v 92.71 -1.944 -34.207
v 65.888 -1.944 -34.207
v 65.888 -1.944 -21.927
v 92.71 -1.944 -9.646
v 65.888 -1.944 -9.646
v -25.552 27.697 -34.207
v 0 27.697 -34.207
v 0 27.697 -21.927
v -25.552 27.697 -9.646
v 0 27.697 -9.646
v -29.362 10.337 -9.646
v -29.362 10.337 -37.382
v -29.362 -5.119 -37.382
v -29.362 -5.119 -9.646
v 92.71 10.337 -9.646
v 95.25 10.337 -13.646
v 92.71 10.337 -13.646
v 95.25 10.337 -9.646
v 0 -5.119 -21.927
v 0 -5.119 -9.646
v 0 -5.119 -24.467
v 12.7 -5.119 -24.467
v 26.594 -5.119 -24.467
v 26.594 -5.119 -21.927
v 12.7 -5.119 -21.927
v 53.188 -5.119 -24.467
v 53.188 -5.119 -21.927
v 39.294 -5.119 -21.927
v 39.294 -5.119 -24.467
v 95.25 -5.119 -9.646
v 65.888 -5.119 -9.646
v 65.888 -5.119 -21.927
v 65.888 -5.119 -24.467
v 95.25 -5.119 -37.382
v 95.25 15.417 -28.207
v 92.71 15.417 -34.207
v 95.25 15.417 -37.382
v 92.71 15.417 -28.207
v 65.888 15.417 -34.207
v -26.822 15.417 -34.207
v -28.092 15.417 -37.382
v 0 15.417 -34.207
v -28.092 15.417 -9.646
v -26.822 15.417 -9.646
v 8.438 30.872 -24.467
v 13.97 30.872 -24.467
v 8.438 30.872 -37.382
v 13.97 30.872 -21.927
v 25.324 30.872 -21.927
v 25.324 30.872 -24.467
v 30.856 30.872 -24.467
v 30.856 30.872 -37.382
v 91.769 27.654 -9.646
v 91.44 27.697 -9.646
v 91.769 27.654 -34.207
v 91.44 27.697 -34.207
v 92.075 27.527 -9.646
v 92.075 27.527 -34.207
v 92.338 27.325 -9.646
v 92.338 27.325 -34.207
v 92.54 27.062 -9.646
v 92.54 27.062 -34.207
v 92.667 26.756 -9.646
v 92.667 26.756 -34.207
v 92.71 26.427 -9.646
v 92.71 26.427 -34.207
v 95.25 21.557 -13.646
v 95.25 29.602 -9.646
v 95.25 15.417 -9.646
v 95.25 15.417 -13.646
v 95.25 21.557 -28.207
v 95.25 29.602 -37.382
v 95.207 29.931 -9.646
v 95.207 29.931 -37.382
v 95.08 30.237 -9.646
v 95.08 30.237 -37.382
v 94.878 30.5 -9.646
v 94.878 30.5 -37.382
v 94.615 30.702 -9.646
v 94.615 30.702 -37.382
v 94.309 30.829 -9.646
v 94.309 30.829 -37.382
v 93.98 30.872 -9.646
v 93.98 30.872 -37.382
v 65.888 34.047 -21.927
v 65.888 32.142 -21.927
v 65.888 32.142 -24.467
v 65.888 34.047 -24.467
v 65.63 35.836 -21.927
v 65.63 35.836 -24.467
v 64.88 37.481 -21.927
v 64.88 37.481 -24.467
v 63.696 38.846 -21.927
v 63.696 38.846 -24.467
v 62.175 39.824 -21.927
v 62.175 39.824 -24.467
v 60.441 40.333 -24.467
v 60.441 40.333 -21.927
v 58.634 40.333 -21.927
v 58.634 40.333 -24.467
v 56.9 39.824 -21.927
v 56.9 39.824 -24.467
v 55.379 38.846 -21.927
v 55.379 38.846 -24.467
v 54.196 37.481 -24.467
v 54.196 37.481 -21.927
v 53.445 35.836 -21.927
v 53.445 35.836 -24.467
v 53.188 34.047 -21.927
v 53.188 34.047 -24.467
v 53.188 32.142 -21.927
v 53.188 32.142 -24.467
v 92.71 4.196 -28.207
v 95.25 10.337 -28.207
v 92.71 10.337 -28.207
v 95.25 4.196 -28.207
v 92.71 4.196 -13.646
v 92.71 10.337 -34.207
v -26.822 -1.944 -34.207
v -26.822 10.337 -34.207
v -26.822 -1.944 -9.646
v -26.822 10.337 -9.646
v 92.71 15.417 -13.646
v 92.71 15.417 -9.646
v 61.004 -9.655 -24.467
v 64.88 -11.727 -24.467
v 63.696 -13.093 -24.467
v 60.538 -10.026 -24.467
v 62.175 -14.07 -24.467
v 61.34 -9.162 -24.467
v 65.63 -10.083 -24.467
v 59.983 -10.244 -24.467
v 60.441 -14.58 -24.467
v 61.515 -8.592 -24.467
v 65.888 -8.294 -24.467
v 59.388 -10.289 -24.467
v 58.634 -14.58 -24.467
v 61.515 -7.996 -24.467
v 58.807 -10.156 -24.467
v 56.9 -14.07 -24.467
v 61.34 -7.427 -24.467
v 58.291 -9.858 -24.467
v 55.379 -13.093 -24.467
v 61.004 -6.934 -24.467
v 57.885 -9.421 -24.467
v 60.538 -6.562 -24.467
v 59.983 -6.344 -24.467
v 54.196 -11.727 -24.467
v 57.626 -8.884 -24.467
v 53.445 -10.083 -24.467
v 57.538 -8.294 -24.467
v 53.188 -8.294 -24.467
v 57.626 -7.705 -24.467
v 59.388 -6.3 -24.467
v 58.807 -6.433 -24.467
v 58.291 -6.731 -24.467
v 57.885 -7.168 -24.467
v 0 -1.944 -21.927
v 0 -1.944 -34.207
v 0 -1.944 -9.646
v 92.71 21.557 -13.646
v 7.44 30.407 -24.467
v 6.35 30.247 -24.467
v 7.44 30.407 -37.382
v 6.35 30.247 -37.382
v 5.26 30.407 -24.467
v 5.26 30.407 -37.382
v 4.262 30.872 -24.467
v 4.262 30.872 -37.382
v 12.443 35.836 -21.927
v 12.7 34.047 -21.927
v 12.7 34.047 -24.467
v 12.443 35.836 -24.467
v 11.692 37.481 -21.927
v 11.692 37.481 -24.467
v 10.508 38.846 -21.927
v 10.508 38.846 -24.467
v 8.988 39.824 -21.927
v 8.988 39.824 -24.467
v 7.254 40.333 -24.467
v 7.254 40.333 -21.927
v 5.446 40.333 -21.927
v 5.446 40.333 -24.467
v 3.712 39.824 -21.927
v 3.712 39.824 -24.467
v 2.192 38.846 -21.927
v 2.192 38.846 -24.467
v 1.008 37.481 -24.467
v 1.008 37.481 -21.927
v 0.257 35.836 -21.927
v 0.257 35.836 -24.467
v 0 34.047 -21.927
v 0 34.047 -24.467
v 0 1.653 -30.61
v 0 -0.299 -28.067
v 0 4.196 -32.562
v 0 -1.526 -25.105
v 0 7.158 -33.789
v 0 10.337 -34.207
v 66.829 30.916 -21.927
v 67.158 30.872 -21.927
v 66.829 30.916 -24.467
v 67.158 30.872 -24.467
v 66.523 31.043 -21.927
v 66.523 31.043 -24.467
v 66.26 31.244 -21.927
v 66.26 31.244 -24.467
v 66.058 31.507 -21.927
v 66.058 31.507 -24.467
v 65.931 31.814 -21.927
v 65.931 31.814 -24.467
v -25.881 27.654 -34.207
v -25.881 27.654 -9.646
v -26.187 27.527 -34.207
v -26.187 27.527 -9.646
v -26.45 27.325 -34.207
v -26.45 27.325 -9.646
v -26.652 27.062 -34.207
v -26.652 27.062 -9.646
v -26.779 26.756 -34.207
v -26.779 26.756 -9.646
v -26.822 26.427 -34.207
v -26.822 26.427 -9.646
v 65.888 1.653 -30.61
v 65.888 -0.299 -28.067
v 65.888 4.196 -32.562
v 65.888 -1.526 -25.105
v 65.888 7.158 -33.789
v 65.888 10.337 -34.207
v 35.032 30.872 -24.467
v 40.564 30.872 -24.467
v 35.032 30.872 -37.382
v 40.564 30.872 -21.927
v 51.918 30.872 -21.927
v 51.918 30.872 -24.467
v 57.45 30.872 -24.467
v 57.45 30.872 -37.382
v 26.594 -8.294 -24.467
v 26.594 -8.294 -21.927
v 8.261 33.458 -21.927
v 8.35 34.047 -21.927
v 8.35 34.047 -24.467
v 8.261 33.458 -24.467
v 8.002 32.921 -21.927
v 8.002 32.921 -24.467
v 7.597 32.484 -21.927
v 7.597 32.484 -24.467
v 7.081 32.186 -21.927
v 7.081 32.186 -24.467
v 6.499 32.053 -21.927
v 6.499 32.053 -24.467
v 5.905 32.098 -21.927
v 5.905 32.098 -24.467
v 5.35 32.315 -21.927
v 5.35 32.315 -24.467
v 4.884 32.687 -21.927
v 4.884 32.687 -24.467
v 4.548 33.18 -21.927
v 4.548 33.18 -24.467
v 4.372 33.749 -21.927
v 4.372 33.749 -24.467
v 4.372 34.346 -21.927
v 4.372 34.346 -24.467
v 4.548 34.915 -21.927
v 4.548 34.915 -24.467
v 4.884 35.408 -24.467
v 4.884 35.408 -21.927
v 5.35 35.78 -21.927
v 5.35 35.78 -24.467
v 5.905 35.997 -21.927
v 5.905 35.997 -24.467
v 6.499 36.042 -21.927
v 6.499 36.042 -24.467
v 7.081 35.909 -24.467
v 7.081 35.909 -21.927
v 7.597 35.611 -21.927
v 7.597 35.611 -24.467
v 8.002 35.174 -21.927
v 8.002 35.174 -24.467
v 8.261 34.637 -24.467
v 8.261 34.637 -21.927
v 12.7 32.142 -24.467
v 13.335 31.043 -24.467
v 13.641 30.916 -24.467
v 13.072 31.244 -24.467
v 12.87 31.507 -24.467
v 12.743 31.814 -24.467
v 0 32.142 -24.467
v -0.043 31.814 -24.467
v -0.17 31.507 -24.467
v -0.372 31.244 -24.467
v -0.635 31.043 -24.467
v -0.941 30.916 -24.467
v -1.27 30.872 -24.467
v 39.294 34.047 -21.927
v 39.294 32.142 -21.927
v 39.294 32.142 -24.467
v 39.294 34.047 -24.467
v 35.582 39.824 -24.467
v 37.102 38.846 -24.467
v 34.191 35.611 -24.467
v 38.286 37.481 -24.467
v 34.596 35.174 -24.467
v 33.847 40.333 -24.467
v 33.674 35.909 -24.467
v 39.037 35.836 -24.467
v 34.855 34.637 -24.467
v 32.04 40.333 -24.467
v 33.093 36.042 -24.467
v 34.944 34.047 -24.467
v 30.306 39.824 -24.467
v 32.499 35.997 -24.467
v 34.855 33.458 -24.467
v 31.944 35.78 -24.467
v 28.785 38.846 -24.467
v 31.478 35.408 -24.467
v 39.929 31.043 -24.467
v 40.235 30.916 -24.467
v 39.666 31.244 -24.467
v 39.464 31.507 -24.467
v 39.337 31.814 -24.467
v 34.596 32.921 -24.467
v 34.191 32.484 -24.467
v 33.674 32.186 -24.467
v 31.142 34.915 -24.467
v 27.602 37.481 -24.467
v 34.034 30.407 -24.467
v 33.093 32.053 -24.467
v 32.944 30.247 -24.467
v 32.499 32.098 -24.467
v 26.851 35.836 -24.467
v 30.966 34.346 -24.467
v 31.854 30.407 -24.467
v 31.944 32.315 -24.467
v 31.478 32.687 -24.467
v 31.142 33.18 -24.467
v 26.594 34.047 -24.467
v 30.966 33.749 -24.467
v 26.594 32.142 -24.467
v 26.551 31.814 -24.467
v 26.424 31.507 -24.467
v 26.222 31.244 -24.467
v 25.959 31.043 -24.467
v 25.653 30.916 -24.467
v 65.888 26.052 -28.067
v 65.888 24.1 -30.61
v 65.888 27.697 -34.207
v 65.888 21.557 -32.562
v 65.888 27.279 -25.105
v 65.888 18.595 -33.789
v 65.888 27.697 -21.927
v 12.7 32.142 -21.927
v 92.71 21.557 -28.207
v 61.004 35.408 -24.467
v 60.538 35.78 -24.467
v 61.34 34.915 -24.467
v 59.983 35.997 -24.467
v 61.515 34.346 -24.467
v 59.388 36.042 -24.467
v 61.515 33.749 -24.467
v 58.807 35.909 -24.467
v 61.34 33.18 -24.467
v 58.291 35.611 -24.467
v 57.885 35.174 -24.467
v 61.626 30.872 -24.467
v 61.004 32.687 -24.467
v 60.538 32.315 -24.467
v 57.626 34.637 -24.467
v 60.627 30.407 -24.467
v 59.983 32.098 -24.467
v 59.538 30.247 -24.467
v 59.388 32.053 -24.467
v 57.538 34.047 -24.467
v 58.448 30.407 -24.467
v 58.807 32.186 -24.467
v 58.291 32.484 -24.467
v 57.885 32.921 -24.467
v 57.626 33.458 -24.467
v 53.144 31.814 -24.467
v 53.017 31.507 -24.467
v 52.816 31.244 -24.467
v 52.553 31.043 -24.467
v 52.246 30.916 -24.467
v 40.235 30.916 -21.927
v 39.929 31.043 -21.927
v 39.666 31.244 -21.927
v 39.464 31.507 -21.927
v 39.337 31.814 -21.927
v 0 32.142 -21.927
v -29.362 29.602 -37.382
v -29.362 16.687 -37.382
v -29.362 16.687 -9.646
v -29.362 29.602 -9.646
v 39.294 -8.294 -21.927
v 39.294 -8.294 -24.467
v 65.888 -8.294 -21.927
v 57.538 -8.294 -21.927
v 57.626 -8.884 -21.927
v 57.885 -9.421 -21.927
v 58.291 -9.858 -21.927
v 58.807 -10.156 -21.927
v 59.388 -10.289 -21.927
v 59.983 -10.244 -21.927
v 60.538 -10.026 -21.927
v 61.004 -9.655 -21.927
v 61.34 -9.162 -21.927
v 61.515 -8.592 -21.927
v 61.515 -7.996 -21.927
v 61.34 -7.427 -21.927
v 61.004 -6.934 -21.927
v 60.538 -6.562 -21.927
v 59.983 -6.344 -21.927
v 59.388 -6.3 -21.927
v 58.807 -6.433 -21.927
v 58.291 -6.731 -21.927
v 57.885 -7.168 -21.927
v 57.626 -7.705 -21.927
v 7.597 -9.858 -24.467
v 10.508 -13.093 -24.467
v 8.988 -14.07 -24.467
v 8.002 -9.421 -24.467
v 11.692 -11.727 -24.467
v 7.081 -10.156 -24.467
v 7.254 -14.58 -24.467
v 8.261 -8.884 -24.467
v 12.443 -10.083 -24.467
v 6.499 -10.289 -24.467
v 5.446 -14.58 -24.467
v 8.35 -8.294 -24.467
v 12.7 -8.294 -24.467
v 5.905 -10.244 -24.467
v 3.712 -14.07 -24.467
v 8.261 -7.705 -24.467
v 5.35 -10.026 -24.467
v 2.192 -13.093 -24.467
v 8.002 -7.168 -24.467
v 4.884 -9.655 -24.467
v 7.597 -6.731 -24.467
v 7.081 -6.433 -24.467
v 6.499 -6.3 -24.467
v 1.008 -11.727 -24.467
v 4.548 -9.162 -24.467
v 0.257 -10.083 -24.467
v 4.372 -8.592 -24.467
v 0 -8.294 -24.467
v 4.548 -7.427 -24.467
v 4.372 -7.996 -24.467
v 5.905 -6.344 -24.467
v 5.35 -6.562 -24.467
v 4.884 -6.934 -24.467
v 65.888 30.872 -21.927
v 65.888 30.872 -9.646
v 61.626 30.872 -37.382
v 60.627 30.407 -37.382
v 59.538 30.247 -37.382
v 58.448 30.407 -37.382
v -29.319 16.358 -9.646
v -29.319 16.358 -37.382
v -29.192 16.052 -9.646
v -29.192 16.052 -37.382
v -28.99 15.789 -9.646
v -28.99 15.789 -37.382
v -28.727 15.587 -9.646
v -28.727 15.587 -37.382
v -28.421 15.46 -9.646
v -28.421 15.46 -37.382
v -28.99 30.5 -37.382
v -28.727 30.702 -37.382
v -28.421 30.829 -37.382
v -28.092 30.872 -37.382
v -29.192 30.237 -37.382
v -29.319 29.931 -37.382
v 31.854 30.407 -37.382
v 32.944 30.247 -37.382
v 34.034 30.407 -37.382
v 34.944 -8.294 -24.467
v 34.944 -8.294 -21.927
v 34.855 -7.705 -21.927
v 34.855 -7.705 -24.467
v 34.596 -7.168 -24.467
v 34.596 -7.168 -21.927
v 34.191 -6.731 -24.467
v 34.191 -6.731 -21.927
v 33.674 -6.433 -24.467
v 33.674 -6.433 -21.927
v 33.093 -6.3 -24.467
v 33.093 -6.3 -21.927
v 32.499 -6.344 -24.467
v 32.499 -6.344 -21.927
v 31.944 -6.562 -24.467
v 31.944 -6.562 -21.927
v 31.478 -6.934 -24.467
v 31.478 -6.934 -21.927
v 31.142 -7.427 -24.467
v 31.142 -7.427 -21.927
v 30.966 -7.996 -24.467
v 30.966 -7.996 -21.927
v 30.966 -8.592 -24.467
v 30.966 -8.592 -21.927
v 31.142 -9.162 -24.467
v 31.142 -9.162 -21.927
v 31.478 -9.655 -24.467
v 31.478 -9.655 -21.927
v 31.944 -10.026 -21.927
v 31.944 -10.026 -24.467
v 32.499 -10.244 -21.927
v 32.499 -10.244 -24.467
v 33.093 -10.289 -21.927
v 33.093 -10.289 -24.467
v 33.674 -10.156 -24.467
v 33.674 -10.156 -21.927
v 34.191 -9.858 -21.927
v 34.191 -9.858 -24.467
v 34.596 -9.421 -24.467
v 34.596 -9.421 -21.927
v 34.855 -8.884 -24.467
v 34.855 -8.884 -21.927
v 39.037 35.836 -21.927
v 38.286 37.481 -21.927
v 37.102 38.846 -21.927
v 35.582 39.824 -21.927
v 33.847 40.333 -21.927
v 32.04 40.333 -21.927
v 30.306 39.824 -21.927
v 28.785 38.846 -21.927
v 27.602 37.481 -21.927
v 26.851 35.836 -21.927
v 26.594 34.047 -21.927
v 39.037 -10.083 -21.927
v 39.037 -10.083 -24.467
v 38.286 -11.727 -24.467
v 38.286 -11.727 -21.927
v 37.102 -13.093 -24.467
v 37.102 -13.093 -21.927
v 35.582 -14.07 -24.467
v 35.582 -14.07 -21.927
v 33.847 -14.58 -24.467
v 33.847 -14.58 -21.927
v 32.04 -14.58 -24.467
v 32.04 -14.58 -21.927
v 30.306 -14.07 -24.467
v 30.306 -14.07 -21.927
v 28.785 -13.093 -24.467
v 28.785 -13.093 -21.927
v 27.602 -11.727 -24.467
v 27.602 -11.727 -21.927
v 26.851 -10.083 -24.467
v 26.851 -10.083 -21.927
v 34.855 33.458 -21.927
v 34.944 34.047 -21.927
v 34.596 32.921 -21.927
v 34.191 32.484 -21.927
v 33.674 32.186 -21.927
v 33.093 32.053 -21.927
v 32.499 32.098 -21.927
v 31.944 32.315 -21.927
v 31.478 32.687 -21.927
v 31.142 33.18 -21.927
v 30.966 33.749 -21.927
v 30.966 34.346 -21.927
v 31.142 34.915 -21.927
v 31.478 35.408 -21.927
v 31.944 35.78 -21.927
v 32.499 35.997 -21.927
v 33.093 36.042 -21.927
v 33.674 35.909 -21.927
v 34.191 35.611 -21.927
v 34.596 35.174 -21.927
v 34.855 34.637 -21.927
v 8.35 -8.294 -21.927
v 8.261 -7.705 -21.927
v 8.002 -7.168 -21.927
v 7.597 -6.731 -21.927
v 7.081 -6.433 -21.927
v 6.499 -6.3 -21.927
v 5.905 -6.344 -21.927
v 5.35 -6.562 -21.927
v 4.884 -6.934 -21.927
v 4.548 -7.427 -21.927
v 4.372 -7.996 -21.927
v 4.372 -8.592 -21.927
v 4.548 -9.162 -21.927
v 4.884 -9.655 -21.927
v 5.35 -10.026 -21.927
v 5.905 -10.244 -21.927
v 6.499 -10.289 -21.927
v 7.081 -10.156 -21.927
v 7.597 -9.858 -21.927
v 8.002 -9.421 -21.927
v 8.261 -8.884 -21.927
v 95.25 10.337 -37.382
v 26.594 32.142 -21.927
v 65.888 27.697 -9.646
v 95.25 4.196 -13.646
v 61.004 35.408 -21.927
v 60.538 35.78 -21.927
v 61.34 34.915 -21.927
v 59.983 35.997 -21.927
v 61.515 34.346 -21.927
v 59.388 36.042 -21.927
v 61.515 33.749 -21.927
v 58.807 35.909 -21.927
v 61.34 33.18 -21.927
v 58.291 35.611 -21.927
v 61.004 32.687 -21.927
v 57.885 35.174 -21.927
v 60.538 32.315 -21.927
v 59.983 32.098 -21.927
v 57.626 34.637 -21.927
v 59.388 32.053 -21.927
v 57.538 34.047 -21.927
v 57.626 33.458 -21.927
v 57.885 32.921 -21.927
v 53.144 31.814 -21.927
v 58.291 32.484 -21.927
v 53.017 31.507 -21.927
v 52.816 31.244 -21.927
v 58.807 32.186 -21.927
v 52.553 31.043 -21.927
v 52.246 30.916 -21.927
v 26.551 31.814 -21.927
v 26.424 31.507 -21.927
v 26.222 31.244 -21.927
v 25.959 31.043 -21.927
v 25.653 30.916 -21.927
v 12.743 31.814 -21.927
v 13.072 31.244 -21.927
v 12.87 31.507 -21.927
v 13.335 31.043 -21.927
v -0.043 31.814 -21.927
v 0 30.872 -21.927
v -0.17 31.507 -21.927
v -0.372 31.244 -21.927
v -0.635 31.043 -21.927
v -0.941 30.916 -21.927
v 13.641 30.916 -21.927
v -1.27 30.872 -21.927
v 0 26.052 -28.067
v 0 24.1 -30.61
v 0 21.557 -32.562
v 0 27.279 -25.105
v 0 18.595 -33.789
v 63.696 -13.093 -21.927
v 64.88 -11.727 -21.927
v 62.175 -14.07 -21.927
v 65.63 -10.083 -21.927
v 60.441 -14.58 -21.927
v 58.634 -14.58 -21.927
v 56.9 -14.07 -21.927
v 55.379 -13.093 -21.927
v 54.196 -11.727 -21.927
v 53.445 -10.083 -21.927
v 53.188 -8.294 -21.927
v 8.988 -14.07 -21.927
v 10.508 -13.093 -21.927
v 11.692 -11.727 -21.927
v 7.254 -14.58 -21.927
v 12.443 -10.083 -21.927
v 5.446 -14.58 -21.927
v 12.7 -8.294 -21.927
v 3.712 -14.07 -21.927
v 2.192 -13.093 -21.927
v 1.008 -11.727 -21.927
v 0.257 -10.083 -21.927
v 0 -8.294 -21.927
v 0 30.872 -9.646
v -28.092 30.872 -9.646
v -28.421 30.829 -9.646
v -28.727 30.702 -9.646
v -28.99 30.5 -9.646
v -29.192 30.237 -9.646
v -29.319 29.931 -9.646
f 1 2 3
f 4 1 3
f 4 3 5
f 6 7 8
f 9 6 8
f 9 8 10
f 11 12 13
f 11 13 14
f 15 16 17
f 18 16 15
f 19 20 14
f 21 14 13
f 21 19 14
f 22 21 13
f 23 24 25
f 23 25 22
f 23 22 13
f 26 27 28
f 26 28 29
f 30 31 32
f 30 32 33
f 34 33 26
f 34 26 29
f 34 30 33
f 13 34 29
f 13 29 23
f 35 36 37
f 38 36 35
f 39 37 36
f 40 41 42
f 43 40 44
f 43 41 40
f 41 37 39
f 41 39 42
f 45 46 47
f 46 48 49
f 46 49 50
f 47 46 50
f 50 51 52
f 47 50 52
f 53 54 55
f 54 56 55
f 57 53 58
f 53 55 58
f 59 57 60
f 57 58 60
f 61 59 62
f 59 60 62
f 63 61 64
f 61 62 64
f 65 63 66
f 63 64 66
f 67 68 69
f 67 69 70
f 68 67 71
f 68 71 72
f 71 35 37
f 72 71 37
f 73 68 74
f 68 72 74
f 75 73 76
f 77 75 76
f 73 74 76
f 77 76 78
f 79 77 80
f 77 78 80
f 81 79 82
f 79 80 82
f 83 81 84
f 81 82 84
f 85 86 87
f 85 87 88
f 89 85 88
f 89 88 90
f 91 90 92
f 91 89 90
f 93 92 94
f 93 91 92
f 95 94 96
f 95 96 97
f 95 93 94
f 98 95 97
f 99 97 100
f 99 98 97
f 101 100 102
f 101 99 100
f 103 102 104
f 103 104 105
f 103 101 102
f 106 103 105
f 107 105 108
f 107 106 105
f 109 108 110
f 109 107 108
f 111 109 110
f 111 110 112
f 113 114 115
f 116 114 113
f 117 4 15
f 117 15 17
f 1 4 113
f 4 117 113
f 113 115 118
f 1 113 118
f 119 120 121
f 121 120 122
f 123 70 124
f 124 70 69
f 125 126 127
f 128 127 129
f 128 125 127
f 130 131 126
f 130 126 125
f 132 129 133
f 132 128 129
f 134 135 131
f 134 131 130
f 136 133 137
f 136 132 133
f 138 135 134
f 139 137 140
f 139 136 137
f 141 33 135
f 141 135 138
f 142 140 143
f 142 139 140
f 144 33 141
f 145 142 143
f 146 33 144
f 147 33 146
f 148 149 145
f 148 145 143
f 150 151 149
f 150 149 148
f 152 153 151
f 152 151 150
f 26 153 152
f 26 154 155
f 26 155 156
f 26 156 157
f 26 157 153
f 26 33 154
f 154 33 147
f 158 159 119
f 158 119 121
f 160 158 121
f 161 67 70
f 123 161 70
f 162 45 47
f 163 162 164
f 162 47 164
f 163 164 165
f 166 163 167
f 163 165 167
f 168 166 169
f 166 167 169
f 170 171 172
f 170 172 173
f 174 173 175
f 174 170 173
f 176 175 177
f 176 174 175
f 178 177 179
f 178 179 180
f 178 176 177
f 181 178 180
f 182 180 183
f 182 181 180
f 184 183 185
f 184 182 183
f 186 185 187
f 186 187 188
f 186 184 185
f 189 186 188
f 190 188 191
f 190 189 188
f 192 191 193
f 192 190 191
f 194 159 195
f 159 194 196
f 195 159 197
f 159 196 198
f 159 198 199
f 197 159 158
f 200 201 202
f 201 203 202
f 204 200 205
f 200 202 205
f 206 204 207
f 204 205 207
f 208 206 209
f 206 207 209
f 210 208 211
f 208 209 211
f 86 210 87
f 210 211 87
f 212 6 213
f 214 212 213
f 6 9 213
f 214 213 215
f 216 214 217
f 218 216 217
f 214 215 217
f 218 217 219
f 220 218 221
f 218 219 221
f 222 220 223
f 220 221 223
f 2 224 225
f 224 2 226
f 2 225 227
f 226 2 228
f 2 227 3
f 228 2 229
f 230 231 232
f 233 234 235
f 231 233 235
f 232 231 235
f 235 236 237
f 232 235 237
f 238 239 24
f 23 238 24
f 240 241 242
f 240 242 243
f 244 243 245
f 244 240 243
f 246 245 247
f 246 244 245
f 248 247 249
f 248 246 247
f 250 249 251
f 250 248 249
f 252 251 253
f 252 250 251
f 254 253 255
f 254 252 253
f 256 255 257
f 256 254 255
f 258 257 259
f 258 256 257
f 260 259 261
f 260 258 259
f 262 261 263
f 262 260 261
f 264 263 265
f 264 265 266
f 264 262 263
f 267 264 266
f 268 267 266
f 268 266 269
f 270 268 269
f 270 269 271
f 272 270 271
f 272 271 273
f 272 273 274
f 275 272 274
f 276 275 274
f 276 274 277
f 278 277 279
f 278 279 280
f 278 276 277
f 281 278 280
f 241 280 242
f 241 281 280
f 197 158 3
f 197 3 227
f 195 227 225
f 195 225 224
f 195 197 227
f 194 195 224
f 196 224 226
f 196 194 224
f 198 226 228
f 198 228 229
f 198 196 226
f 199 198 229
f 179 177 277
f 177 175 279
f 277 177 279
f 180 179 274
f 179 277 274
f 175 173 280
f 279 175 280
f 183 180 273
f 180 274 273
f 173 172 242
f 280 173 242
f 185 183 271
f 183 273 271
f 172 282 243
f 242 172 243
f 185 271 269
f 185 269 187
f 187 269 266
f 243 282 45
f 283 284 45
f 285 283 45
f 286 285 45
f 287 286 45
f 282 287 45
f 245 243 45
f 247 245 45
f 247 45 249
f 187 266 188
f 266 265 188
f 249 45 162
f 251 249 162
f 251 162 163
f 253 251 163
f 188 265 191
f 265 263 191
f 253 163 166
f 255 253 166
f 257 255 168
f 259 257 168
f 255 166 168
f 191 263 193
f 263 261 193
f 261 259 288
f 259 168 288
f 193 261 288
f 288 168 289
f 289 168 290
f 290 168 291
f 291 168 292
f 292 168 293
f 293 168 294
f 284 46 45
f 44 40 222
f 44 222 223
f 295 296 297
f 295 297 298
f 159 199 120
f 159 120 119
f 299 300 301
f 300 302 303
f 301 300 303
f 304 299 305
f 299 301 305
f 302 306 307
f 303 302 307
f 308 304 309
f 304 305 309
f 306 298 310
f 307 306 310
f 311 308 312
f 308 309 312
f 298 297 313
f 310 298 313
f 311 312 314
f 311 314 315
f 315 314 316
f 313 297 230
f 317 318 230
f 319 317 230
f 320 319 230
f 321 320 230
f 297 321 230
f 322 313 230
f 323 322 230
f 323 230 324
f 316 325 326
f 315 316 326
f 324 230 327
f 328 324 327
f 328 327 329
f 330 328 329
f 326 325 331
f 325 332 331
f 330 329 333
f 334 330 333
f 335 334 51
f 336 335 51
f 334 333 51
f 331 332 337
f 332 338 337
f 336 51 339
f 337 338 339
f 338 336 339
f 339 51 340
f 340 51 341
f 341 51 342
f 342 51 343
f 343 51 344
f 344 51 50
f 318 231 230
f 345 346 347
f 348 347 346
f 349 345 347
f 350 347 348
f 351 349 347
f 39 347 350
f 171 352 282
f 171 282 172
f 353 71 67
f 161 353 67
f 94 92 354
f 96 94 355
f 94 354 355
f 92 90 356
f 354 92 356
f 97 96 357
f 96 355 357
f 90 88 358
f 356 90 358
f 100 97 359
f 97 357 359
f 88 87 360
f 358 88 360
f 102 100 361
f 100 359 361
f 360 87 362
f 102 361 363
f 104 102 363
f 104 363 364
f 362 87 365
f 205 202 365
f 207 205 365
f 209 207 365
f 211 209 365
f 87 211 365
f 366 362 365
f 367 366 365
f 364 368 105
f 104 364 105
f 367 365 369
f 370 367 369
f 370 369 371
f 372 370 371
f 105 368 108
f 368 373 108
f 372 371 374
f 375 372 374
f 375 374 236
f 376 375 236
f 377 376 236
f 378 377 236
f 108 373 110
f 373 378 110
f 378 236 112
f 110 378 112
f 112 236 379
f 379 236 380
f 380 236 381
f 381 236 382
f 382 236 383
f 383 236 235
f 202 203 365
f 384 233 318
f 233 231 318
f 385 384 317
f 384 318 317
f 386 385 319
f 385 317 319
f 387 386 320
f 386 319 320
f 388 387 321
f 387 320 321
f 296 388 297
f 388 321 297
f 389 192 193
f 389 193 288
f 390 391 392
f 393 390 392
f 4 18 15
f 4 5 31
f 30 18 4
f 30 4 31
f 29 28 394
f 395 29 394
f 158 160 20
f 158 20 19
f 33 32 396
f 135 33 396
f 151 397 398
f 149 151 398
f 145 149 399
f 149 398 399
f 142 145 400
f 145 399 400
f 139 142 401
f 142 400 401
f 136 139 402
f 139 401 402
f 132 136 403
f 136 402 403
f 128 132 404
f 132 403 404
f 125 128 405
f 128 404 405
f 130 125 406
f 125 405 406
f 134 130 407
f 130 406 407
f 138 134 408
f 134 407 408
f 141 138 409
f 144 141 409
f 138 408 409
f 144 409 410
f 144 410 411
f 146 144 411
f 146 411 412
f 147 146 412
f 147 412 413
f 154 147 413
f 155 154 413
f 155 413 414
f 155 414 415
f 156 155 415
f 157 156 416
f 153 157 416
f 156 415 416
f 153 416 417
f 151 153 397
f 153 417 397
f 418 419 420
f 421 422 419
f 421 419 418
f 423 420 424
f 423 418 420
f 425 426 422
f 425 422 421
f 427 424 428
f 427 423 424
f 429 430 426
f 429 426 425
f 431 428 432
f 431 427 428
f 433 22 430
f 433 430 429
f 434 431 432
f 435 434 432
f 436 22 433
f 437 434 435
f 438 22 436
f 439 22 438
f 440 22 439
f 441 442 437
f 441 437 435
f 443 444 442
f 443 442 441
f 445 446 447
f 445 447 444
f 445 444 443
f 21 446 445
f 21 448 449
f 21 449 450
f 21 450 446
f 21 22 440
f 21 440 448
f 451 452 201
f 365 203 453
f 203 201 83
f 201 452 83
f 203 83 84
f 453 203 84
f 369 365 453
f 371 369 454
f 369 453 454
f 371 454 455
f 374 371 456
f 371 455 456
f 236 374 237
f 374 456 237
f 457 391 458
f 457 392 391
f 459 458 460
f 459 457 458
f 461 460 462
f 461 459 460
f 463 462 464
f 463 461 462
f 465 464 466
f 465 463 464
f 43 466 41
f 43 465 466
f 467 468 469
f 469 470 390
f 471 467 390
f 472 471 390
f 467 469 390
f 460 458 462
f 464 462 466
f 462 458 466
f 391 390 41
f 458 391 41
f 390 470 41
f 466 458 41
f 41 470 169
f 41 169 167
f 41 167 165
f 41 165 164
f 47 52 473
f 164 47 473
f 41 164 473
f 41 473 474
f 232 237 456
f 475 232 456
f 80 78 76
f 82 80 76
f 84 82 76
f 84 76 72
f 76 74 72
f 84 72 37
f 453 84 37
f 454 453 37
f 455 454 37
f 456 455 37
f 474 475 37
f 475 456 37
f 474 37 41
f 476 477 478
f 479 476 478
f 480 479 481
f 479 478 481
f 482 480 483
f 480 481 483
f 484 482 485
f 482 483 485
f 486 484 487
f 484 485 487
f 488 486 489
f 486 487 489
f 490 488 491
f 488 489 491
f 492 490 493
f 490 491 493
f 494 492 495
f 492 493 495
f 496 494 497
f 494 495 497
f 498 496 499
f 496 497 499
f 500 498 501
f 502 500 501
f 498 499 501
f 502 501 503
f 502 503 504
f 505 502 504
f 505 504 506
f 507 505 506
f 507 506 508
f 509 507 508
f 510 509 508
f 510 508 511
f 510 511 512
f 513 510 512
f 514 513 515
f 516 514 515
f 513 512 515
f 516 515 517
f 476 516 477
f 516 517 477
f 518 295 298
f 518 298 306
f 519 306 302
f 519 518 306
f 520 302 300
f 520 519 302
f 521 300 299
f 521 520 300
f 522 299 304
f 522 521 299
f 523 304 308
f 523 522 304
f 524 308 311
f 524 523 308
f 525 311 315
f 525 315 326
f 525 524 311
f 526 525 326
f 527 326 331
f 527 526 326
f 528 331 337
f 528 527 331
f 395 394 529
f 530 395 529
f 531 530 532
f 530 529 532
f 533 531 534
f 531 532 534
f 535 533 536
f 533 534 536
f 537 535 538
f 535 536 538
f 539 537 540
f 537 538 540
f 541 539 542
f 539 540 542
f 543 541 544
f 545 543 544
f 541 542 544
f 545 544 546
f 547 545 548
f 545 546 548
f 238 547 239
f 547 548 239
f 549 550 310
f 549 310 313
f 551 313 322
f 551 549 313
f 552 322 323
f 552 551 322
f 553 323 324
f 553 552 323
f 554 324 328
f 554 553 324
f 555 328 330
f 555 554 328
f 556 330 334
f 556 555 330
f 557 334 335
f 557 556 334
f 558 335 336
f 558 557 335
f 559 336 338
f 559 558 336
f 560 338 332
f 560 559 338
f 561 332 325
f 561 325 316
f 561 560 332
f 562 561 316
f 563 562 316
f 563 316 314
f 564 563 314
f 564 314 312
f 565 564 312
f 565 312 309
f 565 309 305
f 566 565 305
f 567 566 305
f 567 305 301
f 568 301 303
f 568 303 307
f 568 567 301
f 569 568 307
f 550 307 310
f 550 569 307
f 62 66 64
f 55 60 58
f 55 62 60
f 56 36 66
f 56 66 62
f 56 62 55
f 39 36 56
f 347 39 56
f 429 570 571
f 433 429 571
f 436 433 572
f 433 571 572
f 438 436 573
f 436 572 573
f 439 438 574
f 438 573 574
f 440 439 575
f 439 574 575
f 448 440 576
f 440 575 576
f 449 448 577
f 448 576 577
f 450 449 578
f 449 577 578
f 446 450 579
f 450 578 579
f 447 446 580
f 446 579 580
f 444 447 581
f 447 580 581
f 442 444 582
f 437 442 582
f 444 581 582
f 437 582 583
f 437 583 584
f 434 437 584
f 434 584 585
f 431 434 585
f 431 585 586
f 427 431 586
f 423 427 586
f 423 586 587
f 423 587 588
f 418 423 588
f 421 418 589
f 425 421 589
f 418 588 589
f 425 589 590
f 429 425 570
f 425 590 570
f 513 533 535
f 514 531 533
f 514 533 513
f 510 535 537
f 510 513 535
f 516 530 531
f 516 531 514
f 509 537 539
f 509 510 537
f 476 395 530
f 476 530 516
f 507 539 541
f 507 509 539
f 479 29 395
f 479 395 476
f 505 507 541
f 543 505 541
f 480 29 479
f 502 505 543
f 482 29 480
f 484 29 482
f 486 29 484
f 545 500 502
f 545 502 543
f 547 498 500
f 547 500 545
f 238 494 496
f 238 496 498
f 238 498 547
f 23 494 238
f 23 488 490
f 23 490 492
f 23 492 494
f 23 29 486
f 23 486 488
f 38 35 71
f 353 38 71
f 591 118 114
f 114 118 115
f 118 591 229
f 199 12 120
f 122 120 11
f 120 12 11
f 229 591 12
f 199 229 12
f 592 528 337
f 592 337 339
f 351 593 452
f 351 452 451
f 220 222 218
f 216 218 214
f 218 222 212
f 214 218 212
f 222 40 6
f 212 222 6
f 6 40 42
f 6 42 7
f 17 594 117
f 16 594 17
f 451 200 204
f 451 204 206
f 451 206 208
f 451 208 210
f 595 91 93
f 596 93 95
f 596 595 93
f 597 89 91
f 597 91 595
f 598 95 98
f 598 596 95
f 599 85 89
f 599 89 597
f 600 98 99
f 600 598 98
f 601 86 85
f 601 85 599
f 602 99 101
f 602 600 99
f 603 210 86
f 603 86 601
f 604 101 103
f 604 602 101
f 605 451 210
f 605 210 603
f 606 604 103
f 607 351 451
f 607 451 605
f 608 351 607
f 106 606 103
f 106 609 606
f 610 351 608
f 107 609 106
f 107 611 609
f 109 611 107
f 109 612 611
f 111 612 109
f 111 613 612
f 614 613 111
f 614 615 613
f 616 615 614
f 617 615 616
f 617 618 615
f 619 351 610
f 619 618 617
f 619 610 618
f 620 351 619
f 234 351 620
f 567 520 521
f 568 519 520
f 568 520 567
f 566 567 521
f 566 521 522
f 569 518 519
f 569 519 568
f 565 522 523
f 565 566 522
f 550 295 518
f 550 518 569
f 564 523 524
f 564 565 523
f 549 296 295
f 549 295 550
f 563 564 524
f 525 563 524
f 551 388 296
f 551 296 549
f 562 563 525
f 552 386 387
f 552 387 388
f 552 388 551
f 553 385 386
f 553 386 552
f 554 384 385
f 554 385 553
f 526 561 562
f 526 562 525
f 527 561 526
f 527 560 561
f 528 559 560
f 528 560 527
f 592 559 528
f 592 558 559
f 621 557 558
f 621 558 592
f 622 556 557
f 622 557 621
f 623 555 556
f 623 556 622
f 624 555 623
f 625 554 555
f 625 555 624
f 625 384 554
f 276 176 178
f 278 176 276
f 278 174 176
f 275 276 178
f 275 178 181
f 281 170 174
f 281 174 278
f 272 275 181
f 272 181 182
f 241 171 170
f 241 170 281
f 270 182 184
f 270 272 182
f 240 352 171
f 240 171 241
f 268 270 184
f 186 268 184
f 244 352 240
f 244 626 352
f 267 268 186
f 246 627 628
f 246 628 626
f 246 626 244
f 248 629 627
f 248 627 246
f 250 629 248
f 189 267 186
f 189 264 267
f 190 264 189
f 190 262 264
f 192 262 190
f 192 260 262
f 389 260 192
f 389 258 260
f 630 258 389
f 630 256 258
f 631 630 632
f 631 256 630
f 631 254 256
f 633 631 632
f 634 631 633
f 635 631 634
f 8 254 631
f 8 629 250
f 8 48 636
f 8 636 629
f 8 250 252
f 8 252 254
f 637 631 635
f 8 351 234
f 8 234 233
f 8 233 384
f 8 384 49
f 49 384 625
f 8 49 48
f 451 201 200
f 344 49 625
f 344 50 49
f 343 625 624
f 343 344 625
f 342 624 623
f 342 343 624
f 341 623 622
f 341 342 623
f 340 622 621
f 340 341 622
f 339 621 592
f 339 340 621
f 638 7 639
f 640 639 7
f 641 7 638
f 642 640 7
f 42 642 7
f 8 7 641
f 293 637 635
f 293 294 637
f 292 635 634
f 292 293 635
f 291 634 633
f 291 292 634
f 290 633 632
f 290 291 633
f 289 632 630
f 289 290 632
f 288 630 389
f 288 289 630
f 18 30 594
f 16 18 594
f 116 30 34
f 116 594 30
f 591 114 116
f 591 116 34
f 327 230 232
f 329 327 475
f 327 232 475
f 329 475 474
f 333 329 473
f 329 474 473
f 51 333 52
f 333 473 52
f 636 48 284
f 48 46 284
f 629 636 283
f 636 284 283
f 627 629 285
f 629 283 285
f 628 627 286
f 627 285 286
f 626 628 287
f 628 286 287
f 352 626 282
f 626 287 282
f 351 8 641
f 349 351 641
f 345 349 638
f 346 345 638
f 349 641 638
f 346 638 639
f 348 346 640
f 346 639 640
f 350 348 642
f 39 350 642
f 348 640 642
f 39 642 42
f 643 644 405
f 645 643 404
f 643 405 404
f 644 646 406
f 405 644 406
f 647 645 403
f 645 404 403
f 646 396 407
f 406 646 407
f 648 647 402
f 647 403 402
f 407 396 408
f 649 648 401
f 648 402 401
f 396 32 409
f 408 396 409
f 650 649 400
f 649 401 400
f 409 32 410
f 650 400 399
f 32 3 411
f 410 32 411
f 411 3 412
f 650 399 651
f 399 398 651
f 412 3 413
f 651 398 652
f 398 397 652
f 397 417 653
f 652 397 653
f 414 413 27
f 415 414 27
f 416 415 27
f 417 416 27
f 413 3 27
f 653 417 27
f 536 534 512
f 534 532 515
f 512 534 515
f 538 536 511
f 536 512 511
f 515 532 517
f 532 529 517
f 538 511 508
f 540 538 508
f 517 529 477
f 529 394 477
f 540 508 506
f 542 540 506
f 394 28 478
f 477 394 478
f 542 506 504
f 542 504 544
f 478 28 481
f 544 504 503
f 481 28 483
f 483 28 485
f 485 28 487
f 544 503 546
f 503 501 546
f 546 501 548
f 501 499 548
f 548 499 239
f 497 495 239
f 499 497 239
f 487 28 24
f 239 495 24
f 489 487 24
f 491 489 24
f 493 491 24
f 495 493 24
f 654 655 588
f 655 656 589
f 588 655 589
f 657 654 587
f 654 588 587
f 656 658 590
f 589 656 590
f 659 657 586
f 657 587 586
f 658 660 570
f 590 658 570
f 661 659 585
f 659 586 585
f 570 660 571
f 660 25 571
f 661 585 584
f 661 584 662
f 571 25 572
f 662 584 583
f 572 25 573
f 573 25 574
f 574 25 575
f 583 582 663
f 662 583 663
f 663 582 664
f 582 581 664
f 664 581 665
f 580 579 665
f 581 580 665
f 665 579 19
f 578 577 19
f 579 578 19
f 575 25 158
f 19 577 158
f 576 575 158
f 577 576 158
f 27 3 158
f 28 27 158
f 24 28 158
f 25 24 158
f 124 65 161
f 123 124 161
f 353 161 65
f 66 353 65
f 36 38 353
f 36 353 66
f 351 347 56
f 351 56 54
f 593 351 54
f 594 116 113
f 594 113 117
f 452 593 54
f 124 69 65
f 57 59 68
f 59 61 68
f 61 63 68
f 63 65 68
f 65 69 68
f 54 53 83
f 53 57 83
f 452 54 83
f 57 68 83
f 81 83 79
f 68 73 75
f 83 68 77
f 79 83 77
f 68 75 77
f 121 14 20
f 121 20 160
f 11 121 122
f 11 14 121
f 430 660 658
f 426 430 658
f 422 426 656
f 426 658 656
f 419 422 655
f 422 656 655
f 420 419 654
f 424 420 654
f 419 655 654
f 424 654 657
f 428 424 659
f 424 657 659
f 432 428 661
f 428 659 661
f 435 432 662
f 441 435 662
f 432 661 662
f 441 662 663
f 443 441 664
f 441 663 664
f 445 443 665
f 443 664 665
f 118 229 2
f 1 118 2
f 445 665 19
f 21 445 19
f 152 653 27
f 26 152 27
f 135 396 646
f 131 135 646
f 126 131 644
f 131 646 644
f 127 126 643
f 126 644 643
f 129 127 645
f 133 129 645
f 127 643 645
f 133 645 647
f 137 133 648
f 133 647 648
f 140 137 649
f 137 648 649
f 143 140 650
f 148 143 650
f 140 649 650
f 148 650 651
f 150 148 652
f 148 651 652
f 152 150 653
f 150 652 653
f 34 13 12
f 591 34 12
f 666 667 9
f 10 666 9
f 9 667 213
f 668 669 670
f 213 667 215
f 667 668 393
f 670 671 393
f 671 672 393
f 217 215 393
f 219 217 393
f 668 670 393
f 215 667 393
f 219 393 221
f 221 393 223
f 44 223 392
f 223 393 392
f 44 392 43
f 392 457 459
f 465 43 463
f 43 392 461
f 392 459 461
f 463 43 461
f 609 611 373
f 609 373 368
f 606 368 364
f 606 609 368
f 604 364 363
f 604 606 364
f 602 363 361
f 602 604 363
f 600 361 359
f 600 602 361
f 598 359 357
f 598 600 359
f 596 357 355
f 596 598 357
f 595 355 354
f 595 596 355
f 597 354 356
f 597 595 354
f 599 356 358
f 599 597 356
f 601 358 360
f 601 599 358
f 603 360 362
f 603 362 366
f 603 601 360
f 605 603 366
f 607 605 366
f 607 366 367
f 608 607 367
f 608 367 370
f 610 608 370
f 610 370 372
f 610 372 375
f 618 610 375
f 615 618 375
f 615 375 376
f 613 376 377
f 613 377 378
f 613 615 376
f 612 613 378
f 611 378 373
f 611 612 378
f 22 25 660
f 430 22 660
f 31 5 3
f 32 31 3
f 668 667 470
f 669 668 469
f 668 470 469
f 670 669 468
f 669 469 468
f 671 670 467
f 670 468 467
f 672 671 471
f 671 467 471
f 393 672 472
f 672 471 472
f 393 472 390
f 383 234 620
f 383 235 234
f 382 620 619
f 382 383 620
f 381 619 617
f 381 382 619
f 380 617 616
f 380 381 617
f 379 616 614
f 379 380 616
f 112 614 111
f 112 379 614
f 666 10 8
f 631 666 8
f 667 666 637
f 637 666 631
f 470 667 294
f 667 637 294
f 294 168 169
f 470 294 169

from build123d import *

# Parameters (mm, degrees)
BOSS_EXTRUDE1_DEPTH = 65.8876
BOSS_EXTRUDE2_DEPTH = 29.3624
BOSS_EXTRUDE3_DEPTH = 2.54
SKETCH4_R           = 2
BOSS_EXTRUDE4_DEPTH = 2.54
SKETCH6_W           = 24.561
SKETCH6_H           = 12.2809
BOSS_EXTRUDE5_DEPTH = 2.54
FILLET1_R           = 1.27
FILLET2_R           = 1.27
FILLET3_R           = 1.27
SKETCH7_R           = 3.80000002
CUT_EXTRUDE1_DEPTH  = 12.9159


with BuildPart() as part:
    # Sketch1 → Boss-Extrude1 (new body)
    with BuildSketch(Plane(origin=(0, 0, 0), x_dir=(0, 0, -1), z_dir=(1, 0, 0))):
        with BuildLine():
            Line((34.207401555, 10.336569156), (37.382401555, 10.336569156))
            Line((37.382401555, 10.336569156), (37.382401555, -5.119330844))
            Line((37.382401555, -5.119330844), (21.926501555, -5.119330844))
            Line((21.926501555, -5.119330844), (21.926501555, -1.944330844))
            ThreePointArc((21.926501555, -1.944330844), (30.610409224, 1.652661487), (34.207401555, 10.336569156))
        make_face()
    extrude(amount=BOSS_EXTRUDE1_DEPTH)

    # Sketch2 → Boss-Extrude2 (add)
    with BuildSketch(Plane(origin=(65.8876, 0, 0), x_dir=(0, 0, -1), z_dir=(1, 0, 0))):
        Polygon((37.382401555, -1.944330844), (37.382401555, 10.336569156), (34.207401555, 10.336569156), (34.207401555, -1.944330844), (9.646401555, -1.944330844), (9.646401555, -5.119330844), (37.382401555, -5.119330844), align=None)
    boss_extrude2 = extrude(amount=BOSS_EXTRUDE2_DEPTH)

    # Sketch3 → Boss-Extrude3 (add)
    with BuildSketch(Plane(origin=(95.25, 0, 0), x_dir=(0, 0, -1), z_dir=(1, 0, 0))):
        Polygon((28.207401555, 4.196119156), (13.646401555, 4.196119156), (13.646401555, 10.336569156), (9.646401555, 10.336569156), (9.646401555, 4.196119156), (9.646401555, -1.944330844), (28.207401555, -1.944330844), (34.207401555, -1.944330844), (34.207401555, 10.336569156), (28.207401555, 10.336569156), align=None)
    extrude(amount=-BOSS_EXTRUDE3_DEPTH)

    # Sketch4 → Boss-Extrude4 (add)
    # profile 1 of 3: a face of its own
    with BuildSketch(Plane.XY.offset(-21.926501555)):
        with BuildLine():
            Line((0, -8.294330844), (0, -5.119330844))
            Line((0, -5.119330844), (12.7, -5.119330844))
            Line((12.7, -5.119330844), (12.7, -8.294330844))
            ThreePointArc((12.7, -8.294330844), (6.35, -14.644330844), (0, -8.294330844))
        make_face()
        with Locations((6.35, -8.294330844)):
            Circle(SKETCH4_R, mode=Mode.SUBTRACT)
    # profile 2 of 3: a face of its own
    with BuildSketch(Plane.XY.offset(-21.926501555)):
        with BuildLine():
            Line((26.5938, -8.294330844), (26.5938, -5.119330844))
            Line((26.5938, -5.119330844), (39.2938, -5.119330844))
            Line((39.2938, -5.119330844), (39.2938, -8.294330844))
            ThreePointArc((39.2938, -8.294330844), (32.9438, -14.644330844), (26.5938, -8.294330844))
        make_face()
        with Locations((32.9438, -8.294330844)):
            Circle(SKETCH4_R, mode=Mode.SUBTRACT)
    # profile 3 of 3: a face of its own
    with BuildSketch(Plane.XY.offset(-21.926501555)):
        with BuildLine():
            Line((53.1876, -5.119330844), (65.8876, -5.119330844))
            Line((65.8876, -5.119330844), (65.8876, -8.294330844))
            ThreePointArc((65.8876, -8.294330844), (59.5376, -14.644330844), (53.1876, -8.294330844))
            Line((53.1876, -8.294330844), (53.1876, -5.119330844))
        make_face()
        with Locations(Location((59.5376, -8.294330844, 0), (0, 0, 180))):
            Circle(SKETCH4_R, mode=Mode.SUBTRACT)
    extrude(amount=-BOSS_EXTRUDE4_DEPTH)

    # Mirror1: Boss-Extrude2 across plane
    add(boss_extrude2.mirror(Plane(origin=(32.9438, 0, 0), x_dir=(0, 0, 1), z_dir=(1, 0, 0))))

    # Sketch6 → Boss-Extrude5 (add)
    with BuildSketch(Plane.ZY.offset(29.3624)):
        with Locations((-21.926901555, 4.196119156)):
            Rectangle(SKETCH6_W, SKETCH6_H)
    extrude(amount=-BOSS_EXTRUDE5_DEPTH)


with BuildPart() as body_2:
    # Mirror3: mirrored copy
    add(part.part.mirror(Plane.ZX.offset(12.876569156)))

    # Fillet1
    fillet1_edges = [body_2.edges().sort_by_distance(p)[0] for p in [
        (-29.3624, 30.872469156, -23.514401555),
        (-29.3624, 15.416569156, -23.514401555),
        (95.25, 30.872469156, -23.514401555),
    ]]
    fillet(fillet1_edges, radius=FILLET1_R)

    # Fillet2
    fillet2_edges = [body_2.edges().sort_by_distance(p)[0] for p in [
        (0, 30.872469156, -23.196501555),
        (12.7, 30.872469156, -23.196501555),
        (26.5938, 30.872469156, -23.196501555),
        (39.2938, 30.872469156, -23.196501555),
        (65.8876, 30.872469156, -23.196501555),
        (53.1876, 30.872469156, -23.196501555),
    ]]
    fillet(fillet2_edges, radius=FILLET2_R)

    # Fillet3
    fillet3_edges = [body_2.edges().sort_by_distance(p)[0] for p in [
        (-26.8224, 27.697469156, -21.926901555),
        (92.71, 27.697469156, -21.926901555),
    ]]
    fillet(fillet3_edges, radius=FILLET3_R)

    # Sketch7 → Cut-Extrude1 (cut)
    with BuildSketch(Plane(origin=(0, 0, -37.382401555), x_dir=(-1, 0, 0), z_dir=(0, 0, -1))):
        with Locations((-59.5376, 34.047469156)):
            Circle(SKETCH7_R)
        with Locations((-32.9438, 34.047469156)):
            Circle(SKETCH7_R)
        with Locations((-6.35, 34.047469156)):
            Circle(SKETCH7_R)
    extrude(amount=-CUT_EXTRUDE1_DEPTH, mode=Mode.SUBTRACT)


solid = Compound([part.part, body_2.part])
